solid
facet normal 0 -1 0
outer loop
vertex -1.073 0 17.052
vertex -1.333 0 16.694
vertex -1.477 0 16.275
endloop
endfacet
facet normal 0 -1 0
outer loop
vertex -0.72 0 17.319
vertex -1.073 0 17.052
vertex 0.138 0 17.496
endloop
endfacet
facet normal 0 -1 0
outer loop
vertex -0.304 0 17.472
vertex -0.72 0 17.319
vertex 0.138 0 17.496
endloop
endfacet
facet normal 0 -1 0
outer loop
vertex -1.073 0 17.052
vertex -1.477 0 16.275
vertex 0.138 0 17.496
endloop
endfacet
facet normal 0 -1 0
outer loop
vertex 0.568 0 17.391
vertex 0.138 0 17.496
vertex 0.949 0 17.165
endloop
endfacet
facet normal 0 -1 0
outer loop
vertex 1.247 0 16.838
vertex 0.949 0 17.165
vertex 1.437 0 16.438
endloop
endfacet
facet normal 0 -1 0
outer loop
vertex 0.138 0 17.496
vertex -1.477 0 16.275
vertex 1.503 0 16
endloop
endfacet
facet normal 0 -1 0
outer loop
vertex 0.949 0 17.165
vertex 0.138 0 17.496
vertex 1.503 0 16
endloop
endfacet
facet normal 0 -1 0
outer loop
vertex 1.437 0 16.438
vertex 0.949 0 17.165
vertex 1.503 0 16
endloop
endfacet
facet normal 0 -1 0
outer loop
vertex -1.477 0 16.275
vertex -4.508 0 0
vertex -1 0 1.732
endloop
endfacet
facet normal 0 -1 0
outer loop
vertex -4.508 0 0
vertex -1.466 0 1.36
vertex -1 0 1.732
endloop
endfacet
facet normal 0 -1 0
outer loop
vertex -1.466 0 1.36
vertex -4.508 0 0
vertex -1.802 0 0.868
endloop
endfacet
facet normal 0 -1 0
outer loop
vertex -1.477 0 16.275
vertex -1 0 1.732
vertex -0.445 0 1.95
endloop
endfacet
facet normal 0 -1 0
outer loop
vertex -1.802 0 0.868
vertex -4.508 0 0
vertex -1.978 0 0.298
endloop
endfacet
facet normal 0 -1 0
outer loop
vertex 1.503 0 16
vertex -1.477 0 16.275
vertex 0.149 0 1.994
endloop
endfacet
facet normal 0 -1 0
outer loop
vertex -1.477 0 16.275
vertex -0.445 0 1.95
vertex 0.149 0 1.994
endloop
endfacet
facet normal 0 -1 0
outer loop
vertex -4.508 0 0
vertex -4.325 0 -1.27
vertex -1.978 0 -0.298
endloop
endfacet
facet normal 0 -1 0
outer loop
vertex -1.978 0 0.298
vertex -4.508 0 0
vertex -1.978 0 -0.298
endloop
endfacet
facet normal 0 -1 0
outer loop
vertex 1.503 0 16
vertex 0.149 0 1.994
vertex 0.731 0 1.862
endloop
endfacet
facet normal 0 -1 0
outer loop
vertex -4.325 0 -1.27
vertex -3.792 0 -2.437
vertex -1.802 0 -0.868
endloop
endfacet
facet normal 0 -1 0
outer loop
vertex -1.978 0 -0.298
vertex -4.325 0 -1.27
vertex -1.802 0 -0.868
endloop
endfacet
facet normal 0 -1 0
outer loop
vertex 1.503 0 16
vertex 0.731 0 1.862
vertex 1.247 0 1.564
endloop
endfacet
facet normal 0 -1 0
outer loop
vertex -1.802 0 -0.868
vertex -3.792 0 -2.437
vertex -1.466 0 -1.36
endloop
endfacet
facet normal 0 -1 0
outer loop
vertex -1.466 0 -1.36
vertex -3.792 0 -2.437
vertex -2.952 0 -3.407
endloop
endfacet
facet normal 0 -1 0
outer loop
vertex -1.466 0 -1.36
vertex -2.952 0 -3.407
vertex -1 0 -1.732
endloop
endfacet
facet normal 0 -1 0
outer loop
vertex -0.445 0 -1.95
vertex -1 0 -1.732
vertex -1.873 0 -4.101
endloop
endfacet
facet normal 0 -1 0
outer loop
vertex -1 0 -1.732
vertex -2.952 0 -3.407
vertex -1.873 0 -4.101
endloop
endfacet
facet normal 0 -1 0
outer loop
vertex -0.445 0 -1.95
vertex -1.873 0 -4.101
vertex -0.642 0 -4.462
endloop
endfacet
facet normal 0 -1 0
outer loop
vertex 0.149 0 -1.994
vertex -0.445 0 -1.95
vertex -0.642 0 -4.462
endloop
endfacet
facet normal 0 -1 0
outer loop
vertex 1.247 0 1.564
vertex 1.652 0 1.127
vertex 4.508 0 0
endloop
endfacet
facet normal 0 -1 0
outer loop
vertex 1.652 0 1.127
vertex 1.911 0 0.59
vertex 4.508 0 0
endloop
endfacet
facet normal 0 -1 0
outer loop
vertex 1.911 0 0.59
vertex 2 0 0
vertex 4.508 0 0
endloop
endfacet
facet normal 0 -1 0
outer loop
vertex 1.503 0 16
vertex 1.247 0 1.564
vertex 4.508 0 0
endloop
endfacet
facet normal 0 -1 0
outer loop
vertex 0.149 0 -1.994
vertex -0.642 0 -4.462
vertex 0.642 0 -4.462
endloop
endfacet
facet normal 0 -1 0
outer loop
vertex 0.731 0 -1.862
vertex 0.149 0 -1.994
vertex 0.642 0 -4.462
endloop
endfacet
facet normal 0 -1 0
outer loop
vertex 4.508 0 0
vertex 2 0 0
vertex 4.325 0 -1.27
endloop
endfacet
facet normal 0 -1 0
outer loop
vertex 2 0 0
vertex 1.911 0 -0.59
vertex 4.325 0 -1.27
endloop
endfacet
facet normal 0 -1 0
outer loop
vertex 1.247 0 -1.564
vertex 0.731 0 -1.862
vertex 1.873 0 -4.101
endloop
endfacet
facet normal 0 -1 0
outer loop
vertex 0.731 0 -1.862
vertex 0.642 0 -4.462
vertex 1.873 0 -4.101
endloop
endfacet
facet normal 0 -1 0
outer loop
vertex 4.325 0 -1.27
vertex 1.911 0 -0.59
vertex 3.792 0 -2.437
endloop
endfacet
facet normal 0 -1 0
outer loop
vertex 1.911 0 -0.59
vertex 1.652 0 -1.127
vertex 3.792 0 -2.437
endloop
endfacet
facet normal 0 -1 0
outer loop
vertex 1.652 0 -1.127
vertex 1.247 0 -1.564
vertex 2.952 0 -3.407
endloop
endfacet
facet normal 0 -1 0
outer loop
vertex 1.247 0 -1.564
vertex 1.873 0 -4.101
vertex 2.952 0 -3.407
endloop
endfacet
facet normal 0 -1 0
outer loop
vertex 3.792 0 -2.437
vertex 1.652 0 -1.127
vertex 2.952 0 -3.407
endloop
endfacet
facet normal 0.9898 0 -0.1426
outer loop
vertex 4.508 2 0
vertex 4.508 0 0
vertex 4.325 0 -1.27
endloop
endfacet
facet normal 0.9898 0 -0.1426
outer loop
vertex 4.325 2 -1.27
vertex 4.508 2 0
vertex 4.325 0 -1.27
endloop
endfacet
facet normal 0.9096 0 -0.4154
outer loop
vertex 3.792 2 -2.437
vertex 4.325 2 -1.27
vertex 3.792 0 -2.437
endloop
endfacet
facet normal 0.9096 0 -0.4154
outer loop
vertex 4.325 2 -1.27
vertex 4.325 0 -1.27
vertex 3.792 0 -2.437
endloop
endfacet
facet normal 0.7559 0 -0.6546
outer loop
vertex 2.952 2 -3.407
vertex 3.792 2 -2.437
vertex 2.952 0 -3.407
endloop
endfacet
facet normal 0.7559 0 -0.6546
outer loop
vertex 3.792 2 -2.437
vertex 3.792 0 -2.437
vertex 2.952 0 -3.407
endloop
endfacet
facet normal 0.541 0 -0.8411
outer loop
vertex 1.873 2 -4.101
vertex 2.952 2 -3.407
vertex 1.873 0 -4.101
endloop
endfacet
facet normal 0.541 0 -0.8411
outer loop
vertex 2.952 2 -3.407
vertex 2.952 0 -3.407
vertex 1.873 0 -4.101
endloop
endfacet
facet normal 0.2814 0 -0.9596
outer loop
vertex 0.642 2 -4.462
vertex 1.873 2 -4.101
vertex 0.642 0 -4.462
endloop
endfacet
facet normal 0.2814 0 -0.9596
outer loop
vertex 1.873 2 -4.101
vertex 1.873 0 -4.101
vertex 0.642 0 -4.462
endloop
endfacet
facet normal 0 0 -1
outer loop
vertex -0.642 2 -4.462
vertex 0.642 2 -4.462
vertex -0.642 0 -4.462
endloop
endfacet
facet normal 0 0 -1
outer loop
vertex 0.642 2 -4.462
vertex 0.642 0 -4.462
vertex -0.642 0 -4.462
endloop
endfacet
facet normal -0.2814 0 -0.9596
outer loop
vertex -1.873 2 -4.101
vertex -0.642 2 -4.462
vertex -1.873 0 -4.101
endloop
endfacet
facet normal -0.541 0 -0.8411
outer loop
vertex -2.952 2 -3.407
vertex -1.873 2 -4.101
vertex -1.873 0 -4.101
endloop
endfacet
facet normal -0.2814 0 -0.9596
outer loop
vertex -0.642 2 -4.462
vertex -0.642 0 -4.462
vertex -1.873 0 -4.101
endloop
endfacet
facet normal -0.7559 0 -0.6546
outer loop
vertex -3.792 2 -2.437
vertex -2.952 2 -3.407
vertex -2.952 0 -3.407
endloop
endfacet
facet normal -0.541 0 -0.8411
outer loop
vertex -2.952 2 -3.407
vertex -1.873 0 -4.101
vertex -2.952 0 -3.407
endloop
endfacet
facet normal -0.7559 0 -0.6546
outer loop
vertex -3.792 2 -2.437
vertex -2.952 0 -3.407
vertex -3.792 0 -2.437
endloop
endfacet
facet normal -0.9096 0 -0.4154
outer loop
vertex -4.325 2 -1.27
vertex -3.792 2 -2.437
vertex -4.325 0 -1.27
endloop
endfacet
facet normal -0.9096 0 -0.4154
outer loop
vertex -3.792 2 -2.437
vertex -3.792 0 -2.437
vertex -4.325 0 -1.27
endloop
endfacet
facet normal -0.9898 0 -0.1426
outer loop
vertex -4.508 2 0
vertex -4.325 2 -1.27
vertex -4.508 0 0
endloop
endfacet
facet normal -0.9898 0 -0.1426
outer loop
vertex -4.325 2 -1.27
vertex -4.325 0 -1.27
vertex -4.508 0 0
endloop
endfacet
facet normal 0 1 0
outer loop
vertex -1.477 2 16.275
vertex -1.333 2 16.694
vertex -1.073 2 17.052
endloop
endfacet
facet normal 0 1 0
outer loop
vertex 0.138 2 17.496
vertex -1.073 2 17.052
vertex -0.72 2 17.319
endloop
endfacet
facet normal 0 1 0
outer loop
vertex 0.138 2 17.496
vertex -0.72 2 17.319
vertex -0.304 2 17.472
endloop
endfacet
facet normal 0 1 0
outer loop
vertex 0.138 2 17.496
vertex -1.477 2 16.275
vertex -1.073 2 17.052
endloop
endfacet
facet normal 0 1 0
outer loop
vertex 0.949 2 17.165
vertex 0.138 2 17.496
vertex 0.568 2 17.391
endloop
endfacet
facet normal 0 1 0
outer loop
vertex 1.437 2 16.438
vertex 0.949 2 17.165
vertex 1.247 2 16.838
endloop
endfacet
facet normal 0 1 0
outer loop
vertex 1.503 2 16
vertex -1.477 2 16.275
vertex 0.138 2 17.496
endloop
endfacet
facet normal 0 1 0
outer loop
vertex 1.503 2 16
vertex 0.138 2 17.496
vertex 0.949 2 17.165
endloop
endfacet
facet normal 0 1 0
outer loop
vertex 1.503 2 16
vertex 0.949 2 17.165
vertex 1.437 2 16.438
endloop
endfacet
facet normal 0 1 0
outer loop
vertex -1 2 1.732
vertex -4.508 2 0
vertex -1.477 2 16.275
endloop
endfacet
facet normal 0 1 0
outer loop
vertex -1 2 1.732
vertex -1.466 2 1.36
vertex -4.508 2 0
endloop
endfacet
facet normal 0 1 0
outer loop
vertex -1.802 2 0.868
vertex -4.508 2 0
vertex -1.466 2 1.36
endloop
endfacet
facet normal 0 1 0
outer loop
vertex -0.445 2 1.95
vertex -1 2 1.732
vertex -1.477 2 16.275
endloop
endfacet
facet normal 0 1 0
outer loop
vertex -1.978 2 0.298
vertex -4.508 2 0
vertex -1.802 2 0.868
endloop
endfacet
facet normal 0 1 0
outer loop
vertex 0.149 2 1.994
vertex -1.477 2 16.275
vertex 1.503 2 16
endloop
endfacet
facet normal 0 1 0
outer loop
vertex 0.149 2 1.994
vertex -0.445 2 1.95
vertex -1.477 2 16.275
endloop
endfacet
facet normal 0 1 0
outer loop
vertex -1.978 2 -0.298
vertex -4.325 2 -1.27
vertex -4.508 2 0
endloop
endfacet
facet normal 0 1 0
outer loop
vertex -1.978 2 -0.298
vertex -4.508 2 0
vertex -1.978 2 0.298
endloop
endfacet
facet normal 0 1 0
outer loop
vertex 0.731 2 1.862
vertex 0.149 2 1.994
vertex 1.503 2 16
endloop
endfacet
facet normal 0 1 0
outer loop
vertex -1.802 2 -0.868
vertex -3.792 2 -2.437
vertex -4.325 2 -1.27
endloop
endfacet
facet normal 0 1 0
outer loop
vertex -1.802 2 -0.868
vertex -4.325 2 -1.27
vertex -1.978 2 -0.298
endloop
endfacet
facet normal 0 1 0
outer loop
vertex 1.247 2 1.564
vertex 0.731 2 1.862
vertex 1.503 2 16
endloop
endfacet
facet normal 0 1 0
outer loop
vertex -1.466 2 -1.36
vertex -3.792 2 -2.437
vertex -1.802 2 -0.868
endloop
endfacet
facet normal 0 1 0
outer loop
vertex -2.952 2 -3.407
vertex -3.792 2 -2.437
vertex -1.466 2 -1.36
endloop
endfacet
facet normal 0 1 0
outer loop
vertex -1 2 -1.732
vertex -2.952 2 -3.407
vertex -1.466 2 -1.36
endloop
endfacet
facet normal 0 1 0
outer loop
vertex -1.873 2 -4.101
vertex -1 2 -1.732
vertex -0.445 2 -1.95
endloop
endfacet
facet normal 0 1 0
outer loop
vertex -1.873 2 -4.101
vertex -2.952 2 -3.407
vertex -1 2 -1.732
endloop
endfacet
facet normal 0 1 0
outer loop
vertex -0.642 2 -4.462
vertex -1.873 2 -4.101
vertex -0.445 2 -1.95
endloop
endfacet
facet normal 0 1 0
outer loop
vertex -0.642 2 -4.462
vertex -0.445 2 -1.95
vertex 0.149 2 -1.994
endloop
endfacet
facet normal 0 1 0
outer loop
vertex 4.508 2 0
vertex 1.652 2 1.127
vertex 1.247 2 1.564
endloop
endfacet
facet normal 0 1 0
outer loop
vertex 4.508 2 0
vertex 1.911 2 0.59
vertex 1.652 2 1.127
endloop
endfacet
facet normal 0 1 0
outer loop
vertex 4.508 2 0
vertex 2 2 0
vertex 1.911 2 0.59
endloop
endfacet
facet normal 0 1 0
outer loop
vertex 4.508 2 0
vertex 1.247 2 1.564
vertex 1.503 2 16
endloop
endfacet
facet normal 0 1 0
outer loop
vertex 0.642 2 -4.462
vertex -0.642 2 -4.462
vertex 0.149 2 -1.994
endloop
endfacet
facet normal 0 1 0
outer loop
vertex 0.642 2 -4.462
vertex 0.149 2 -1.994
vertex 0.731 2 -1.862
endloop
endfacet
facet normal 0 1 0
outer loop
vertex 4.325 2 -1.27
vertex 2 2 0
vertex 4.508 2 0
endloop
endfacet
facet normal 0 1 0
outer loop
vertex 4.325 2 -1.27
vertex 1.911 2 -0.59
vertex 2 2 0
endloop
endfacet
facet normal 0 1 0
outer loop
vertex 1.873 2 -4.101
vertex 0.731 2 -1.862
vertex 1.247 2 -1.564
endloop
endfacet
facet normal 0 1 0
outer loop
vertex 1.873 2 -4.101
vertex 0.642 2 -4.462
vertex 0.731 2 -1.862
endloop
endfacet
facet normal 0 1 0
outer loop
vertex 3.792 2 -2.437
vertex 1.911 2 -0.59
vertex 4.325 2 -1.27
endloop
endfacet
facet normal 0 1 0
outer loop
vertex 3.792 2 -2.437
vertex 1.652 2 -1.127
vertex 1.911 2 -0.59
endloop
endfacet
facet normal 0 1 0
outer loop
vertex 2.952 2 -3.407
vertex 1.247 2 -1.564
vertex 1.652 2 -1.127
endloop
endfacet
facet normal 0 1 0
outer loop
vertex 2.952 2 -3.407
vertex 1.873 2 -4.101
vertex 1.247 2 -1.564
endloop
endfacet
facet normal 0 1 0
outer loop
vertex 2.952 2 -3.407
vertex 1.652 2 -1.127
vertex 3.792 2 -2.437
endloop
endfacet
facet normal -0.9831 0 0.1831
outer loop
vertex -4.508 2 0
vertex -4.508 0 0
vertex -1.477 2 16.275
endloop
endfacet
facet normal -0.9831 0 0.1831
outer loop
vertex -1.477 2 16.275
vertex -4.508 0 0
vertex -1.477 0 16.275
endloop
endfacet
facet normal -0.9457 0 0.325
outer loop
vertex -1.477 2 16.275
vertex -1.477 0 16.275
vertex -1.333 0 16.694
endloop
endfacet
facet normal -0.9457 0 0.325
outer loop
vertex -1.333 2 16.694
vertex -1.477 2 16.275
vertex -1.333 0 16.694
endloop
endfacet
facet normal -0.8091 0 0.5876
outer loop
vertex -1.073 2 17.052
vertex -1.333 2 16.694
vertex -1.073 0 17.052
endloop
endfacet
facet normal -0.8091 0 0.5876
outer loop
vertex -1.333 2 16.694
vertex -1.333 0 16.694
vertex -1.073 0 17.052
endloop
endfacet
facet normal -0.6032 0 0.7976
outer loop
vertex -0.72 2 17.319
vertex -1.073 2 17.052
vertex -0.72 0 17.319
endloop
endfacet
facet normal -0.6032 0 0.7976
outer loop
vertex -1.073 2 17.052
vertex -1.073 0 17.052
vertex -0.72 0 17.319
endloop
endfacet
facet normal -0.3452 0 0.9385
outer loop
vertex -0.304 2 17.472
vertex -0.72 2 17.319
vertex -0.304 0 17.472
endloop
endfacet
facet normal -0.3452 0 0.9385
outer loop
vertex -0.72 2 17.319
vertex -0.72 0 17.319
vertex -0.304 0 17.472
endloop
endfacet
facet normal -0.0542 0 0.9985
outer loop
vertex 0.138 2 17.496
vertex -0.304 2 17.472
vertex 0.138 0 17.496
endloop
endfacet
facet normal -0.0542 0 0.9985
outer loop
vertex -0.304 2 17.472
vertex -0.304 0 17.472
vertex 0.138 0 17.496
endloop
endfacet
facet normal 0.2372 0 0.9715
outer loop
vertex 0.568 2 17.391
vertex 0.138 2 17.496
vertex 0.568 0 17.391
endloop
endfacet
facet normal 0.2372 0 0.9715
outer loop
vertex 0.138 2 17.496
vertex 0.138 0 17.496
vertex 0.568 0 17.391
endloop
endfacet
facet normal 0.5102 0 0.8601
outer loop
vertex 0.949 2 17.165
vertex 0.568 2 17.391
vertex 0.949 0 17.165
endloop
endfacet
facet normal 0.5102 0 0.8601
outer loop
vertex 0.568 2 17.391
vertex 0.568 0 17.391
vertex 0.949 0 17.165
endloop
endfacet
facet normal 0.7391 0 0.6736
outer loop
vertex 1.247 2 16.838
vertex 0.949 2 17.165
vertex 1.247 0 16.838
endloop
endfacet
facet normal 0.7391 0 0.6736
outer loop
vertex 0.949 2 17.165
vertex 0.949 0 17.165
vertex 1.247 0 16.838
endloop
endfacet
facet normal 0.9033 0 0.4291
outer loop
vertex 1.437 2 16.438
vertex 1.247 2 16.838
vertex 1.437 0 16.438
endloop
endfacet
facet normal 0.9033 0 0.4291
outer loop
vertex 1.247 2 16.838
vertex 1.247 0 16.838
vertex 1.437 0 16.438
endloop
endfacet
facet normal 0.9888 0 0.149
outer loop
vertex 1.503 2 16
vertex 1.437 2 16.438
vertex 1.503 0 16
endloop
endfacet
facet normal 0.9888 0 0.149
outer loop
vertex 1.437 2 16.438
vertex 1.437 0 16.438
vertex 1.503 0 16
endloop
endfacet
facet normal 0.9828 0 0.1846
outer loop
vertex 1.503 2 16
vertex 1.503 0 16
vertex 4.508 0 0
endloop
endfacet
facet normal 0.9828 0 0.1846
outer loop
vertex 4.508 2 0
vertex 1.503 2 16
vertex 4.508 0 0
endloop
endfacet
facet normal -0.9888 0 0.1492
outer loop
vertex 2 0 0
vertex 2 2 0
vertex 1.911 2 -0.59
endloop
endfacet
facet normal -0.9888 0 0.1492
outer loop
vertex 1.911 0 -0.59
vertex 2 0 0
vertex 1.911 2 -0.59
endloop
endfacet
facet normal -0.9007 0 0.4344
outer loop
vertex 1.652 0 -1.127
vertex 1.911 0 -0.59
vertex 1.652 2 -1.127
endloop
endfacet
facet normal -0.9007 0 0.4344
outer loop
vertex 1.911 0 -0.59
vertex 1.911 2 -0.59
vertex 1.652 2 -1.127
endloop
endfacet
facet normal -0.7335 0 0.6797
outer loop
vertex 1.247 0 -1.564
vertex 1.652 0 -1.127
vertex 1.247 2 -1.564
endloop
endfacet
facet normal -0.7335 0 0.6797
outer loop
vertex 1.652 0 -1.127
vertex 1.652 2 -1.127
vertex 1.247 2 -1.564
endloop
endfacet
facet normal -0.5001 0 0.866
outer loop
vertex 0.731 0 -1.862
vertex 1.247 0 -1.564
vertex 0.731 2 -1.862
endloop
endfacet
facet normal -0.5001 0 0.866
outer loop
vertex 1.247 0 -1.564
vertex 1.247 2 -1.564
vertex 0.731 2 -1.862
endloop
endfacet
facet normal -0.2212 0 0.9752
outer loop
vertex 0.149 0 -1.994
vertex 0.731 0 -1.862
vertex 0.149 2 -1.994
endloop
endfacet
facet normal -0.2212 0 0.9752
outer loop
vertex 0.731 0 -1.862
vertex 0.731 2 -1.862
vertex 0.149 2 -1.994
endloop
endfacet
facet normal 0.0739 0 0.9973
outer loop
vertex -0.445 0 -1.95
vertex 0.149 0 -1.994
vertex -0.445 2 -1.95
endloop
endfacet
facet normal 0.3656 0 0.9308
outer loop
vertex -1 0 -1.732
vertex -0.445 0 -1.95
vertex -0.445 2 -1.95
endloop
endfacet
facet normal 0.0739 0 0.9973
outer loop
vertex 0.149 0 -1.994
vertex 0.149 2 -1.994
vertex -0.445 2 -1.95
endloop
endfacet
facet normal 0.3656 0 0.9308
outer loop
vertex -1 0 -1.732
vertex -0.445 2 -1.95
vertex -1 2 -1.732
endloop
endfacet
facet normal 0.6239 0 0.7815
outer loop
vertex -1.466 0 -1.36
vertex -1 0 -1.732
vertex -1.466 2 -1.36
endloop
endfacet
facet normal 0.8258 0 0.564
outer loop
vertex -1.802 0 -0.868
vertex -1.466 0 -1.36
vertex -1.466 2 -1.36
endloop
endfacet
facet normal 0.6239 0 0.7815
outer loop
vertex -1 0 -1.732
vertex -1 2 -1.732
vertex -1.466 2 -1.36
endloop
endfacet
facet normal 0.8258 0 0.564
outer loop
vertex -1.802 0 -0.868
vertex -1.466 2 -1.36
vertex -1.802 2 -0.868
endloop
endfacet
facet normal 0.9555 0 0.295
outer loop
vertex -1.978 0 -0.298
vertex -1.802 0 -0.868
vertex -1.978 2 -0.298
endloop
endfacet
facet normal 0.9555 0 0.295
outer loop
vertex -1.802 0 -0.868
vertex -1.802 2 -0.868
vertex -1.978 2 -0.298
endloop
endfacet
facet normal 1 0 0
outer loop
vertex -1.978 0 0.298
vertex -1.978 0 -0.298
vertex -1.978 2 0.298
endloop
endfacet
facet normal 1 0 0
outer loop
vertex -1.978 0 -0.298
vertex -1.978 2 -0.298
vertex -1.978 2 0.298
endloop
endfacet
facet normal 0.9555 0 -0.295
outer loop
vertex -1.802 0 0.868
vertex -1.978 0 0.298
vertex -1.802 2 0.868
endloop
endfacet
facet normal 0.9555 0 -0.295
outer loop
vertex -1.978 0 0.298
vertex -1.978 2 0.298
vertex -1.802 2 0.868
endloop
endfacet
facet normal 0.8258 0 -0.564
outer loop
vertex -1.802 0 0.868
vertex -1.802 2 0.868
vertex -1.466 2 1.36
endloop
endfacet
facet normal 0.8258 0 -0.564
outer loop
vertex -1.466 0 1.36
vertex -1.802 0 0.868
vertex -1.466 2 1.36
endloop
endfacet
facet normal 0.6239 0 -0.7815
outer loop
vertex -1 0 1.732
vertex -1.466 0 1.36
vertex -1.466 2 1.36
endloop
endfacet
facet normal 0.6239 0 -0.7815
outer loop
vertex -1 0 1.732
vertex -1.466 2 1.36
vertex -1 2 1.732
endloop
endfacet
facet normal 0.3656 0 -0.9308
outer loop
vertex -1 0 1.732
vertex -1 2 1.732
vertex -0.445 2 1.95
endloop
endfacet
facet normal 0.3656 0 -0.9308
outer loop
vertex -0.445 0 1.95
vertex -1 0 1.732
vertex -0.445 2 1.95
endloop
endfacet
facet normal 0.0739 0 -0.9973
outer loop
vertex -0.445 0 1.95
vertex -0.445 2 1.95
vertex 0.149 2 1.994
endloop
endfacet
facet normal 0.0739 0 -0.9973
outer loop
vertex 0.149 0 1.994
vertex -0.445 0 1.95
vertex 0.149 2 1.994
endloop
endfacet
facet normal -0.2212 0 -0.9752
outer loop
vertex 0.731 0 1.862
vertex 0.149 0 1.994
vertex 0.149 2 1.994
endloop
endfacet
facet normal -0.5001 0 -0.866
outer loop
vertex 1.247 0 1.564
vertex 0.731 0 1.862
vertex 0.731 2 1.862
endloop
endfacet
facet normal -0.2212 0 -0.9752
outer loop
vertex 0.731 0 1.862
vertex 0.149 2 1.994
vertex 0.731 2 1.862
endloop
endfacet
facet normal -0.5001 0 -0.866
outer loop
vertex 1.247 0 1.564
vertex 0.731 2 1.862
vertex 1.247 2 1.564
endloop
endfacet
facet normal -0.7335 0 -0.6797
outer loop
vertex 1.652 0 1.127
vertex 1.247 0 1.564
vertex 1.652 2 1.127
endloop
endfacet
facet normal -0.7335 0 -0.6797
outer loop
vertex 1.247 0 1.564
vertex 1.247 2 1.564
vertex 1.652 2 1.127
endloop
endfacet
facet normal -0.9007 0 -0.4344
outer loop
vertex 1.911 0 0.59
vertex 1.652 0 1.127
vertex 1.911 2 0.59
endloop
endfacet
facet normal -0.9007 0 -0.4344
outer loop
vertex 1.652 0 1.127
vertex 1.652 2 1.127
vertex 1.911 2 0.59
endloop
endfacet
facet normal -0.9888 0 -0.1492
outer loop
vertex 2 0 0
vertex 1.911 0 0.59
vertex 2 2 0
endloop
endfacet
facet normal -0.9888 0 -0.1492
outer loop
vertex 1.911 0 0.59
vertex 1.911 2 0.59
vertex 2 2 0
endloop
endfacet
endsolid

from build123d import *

# Parameters (mm, degrees)
EXTRUDE_1_DEPTH     = 2
SKETCH_2_R          = 2
CUT_EXTRUDE_1_DEPTH = 2


with BuildPart() as part:
    # 草图1 → 凸台-拉伸1 (new body)
    with BuildSketch(Plane(origin=(0, 0, 0), x_dir=(1, 0, 0), z_dir=(0, 1, 0))):
        with BuildLine():
            Line((-4.507909161, 0), (-1.477242174, -16.275084839))
            ThreePointArc((-1.477242174, -16.275084839), (0.138127237, -17.496274365), (1.502636386, -16))
            Line((1.502636386, -16), (4.507909161, 0))
            ThreePointArc((4.507909161, 0), (0, 4.507909161), (-4.507909161, 0))
        make_face()
    extrude(amount=EXTRUDE_1_DEPTH)

    # 草图2 → 切除-拉伸1 (cut)
    with BuildSketch(Plane(origin=(0, 2, 0), x_dir=(1, 0, 0), z_dir=(0, 1, 0))):
        Circle(SKETCH_2_R)
    extrude(amount=-CUT_EXTRUDE_1_DEPTH, mode=Mode.SUBTRACT)


solid = part.part
